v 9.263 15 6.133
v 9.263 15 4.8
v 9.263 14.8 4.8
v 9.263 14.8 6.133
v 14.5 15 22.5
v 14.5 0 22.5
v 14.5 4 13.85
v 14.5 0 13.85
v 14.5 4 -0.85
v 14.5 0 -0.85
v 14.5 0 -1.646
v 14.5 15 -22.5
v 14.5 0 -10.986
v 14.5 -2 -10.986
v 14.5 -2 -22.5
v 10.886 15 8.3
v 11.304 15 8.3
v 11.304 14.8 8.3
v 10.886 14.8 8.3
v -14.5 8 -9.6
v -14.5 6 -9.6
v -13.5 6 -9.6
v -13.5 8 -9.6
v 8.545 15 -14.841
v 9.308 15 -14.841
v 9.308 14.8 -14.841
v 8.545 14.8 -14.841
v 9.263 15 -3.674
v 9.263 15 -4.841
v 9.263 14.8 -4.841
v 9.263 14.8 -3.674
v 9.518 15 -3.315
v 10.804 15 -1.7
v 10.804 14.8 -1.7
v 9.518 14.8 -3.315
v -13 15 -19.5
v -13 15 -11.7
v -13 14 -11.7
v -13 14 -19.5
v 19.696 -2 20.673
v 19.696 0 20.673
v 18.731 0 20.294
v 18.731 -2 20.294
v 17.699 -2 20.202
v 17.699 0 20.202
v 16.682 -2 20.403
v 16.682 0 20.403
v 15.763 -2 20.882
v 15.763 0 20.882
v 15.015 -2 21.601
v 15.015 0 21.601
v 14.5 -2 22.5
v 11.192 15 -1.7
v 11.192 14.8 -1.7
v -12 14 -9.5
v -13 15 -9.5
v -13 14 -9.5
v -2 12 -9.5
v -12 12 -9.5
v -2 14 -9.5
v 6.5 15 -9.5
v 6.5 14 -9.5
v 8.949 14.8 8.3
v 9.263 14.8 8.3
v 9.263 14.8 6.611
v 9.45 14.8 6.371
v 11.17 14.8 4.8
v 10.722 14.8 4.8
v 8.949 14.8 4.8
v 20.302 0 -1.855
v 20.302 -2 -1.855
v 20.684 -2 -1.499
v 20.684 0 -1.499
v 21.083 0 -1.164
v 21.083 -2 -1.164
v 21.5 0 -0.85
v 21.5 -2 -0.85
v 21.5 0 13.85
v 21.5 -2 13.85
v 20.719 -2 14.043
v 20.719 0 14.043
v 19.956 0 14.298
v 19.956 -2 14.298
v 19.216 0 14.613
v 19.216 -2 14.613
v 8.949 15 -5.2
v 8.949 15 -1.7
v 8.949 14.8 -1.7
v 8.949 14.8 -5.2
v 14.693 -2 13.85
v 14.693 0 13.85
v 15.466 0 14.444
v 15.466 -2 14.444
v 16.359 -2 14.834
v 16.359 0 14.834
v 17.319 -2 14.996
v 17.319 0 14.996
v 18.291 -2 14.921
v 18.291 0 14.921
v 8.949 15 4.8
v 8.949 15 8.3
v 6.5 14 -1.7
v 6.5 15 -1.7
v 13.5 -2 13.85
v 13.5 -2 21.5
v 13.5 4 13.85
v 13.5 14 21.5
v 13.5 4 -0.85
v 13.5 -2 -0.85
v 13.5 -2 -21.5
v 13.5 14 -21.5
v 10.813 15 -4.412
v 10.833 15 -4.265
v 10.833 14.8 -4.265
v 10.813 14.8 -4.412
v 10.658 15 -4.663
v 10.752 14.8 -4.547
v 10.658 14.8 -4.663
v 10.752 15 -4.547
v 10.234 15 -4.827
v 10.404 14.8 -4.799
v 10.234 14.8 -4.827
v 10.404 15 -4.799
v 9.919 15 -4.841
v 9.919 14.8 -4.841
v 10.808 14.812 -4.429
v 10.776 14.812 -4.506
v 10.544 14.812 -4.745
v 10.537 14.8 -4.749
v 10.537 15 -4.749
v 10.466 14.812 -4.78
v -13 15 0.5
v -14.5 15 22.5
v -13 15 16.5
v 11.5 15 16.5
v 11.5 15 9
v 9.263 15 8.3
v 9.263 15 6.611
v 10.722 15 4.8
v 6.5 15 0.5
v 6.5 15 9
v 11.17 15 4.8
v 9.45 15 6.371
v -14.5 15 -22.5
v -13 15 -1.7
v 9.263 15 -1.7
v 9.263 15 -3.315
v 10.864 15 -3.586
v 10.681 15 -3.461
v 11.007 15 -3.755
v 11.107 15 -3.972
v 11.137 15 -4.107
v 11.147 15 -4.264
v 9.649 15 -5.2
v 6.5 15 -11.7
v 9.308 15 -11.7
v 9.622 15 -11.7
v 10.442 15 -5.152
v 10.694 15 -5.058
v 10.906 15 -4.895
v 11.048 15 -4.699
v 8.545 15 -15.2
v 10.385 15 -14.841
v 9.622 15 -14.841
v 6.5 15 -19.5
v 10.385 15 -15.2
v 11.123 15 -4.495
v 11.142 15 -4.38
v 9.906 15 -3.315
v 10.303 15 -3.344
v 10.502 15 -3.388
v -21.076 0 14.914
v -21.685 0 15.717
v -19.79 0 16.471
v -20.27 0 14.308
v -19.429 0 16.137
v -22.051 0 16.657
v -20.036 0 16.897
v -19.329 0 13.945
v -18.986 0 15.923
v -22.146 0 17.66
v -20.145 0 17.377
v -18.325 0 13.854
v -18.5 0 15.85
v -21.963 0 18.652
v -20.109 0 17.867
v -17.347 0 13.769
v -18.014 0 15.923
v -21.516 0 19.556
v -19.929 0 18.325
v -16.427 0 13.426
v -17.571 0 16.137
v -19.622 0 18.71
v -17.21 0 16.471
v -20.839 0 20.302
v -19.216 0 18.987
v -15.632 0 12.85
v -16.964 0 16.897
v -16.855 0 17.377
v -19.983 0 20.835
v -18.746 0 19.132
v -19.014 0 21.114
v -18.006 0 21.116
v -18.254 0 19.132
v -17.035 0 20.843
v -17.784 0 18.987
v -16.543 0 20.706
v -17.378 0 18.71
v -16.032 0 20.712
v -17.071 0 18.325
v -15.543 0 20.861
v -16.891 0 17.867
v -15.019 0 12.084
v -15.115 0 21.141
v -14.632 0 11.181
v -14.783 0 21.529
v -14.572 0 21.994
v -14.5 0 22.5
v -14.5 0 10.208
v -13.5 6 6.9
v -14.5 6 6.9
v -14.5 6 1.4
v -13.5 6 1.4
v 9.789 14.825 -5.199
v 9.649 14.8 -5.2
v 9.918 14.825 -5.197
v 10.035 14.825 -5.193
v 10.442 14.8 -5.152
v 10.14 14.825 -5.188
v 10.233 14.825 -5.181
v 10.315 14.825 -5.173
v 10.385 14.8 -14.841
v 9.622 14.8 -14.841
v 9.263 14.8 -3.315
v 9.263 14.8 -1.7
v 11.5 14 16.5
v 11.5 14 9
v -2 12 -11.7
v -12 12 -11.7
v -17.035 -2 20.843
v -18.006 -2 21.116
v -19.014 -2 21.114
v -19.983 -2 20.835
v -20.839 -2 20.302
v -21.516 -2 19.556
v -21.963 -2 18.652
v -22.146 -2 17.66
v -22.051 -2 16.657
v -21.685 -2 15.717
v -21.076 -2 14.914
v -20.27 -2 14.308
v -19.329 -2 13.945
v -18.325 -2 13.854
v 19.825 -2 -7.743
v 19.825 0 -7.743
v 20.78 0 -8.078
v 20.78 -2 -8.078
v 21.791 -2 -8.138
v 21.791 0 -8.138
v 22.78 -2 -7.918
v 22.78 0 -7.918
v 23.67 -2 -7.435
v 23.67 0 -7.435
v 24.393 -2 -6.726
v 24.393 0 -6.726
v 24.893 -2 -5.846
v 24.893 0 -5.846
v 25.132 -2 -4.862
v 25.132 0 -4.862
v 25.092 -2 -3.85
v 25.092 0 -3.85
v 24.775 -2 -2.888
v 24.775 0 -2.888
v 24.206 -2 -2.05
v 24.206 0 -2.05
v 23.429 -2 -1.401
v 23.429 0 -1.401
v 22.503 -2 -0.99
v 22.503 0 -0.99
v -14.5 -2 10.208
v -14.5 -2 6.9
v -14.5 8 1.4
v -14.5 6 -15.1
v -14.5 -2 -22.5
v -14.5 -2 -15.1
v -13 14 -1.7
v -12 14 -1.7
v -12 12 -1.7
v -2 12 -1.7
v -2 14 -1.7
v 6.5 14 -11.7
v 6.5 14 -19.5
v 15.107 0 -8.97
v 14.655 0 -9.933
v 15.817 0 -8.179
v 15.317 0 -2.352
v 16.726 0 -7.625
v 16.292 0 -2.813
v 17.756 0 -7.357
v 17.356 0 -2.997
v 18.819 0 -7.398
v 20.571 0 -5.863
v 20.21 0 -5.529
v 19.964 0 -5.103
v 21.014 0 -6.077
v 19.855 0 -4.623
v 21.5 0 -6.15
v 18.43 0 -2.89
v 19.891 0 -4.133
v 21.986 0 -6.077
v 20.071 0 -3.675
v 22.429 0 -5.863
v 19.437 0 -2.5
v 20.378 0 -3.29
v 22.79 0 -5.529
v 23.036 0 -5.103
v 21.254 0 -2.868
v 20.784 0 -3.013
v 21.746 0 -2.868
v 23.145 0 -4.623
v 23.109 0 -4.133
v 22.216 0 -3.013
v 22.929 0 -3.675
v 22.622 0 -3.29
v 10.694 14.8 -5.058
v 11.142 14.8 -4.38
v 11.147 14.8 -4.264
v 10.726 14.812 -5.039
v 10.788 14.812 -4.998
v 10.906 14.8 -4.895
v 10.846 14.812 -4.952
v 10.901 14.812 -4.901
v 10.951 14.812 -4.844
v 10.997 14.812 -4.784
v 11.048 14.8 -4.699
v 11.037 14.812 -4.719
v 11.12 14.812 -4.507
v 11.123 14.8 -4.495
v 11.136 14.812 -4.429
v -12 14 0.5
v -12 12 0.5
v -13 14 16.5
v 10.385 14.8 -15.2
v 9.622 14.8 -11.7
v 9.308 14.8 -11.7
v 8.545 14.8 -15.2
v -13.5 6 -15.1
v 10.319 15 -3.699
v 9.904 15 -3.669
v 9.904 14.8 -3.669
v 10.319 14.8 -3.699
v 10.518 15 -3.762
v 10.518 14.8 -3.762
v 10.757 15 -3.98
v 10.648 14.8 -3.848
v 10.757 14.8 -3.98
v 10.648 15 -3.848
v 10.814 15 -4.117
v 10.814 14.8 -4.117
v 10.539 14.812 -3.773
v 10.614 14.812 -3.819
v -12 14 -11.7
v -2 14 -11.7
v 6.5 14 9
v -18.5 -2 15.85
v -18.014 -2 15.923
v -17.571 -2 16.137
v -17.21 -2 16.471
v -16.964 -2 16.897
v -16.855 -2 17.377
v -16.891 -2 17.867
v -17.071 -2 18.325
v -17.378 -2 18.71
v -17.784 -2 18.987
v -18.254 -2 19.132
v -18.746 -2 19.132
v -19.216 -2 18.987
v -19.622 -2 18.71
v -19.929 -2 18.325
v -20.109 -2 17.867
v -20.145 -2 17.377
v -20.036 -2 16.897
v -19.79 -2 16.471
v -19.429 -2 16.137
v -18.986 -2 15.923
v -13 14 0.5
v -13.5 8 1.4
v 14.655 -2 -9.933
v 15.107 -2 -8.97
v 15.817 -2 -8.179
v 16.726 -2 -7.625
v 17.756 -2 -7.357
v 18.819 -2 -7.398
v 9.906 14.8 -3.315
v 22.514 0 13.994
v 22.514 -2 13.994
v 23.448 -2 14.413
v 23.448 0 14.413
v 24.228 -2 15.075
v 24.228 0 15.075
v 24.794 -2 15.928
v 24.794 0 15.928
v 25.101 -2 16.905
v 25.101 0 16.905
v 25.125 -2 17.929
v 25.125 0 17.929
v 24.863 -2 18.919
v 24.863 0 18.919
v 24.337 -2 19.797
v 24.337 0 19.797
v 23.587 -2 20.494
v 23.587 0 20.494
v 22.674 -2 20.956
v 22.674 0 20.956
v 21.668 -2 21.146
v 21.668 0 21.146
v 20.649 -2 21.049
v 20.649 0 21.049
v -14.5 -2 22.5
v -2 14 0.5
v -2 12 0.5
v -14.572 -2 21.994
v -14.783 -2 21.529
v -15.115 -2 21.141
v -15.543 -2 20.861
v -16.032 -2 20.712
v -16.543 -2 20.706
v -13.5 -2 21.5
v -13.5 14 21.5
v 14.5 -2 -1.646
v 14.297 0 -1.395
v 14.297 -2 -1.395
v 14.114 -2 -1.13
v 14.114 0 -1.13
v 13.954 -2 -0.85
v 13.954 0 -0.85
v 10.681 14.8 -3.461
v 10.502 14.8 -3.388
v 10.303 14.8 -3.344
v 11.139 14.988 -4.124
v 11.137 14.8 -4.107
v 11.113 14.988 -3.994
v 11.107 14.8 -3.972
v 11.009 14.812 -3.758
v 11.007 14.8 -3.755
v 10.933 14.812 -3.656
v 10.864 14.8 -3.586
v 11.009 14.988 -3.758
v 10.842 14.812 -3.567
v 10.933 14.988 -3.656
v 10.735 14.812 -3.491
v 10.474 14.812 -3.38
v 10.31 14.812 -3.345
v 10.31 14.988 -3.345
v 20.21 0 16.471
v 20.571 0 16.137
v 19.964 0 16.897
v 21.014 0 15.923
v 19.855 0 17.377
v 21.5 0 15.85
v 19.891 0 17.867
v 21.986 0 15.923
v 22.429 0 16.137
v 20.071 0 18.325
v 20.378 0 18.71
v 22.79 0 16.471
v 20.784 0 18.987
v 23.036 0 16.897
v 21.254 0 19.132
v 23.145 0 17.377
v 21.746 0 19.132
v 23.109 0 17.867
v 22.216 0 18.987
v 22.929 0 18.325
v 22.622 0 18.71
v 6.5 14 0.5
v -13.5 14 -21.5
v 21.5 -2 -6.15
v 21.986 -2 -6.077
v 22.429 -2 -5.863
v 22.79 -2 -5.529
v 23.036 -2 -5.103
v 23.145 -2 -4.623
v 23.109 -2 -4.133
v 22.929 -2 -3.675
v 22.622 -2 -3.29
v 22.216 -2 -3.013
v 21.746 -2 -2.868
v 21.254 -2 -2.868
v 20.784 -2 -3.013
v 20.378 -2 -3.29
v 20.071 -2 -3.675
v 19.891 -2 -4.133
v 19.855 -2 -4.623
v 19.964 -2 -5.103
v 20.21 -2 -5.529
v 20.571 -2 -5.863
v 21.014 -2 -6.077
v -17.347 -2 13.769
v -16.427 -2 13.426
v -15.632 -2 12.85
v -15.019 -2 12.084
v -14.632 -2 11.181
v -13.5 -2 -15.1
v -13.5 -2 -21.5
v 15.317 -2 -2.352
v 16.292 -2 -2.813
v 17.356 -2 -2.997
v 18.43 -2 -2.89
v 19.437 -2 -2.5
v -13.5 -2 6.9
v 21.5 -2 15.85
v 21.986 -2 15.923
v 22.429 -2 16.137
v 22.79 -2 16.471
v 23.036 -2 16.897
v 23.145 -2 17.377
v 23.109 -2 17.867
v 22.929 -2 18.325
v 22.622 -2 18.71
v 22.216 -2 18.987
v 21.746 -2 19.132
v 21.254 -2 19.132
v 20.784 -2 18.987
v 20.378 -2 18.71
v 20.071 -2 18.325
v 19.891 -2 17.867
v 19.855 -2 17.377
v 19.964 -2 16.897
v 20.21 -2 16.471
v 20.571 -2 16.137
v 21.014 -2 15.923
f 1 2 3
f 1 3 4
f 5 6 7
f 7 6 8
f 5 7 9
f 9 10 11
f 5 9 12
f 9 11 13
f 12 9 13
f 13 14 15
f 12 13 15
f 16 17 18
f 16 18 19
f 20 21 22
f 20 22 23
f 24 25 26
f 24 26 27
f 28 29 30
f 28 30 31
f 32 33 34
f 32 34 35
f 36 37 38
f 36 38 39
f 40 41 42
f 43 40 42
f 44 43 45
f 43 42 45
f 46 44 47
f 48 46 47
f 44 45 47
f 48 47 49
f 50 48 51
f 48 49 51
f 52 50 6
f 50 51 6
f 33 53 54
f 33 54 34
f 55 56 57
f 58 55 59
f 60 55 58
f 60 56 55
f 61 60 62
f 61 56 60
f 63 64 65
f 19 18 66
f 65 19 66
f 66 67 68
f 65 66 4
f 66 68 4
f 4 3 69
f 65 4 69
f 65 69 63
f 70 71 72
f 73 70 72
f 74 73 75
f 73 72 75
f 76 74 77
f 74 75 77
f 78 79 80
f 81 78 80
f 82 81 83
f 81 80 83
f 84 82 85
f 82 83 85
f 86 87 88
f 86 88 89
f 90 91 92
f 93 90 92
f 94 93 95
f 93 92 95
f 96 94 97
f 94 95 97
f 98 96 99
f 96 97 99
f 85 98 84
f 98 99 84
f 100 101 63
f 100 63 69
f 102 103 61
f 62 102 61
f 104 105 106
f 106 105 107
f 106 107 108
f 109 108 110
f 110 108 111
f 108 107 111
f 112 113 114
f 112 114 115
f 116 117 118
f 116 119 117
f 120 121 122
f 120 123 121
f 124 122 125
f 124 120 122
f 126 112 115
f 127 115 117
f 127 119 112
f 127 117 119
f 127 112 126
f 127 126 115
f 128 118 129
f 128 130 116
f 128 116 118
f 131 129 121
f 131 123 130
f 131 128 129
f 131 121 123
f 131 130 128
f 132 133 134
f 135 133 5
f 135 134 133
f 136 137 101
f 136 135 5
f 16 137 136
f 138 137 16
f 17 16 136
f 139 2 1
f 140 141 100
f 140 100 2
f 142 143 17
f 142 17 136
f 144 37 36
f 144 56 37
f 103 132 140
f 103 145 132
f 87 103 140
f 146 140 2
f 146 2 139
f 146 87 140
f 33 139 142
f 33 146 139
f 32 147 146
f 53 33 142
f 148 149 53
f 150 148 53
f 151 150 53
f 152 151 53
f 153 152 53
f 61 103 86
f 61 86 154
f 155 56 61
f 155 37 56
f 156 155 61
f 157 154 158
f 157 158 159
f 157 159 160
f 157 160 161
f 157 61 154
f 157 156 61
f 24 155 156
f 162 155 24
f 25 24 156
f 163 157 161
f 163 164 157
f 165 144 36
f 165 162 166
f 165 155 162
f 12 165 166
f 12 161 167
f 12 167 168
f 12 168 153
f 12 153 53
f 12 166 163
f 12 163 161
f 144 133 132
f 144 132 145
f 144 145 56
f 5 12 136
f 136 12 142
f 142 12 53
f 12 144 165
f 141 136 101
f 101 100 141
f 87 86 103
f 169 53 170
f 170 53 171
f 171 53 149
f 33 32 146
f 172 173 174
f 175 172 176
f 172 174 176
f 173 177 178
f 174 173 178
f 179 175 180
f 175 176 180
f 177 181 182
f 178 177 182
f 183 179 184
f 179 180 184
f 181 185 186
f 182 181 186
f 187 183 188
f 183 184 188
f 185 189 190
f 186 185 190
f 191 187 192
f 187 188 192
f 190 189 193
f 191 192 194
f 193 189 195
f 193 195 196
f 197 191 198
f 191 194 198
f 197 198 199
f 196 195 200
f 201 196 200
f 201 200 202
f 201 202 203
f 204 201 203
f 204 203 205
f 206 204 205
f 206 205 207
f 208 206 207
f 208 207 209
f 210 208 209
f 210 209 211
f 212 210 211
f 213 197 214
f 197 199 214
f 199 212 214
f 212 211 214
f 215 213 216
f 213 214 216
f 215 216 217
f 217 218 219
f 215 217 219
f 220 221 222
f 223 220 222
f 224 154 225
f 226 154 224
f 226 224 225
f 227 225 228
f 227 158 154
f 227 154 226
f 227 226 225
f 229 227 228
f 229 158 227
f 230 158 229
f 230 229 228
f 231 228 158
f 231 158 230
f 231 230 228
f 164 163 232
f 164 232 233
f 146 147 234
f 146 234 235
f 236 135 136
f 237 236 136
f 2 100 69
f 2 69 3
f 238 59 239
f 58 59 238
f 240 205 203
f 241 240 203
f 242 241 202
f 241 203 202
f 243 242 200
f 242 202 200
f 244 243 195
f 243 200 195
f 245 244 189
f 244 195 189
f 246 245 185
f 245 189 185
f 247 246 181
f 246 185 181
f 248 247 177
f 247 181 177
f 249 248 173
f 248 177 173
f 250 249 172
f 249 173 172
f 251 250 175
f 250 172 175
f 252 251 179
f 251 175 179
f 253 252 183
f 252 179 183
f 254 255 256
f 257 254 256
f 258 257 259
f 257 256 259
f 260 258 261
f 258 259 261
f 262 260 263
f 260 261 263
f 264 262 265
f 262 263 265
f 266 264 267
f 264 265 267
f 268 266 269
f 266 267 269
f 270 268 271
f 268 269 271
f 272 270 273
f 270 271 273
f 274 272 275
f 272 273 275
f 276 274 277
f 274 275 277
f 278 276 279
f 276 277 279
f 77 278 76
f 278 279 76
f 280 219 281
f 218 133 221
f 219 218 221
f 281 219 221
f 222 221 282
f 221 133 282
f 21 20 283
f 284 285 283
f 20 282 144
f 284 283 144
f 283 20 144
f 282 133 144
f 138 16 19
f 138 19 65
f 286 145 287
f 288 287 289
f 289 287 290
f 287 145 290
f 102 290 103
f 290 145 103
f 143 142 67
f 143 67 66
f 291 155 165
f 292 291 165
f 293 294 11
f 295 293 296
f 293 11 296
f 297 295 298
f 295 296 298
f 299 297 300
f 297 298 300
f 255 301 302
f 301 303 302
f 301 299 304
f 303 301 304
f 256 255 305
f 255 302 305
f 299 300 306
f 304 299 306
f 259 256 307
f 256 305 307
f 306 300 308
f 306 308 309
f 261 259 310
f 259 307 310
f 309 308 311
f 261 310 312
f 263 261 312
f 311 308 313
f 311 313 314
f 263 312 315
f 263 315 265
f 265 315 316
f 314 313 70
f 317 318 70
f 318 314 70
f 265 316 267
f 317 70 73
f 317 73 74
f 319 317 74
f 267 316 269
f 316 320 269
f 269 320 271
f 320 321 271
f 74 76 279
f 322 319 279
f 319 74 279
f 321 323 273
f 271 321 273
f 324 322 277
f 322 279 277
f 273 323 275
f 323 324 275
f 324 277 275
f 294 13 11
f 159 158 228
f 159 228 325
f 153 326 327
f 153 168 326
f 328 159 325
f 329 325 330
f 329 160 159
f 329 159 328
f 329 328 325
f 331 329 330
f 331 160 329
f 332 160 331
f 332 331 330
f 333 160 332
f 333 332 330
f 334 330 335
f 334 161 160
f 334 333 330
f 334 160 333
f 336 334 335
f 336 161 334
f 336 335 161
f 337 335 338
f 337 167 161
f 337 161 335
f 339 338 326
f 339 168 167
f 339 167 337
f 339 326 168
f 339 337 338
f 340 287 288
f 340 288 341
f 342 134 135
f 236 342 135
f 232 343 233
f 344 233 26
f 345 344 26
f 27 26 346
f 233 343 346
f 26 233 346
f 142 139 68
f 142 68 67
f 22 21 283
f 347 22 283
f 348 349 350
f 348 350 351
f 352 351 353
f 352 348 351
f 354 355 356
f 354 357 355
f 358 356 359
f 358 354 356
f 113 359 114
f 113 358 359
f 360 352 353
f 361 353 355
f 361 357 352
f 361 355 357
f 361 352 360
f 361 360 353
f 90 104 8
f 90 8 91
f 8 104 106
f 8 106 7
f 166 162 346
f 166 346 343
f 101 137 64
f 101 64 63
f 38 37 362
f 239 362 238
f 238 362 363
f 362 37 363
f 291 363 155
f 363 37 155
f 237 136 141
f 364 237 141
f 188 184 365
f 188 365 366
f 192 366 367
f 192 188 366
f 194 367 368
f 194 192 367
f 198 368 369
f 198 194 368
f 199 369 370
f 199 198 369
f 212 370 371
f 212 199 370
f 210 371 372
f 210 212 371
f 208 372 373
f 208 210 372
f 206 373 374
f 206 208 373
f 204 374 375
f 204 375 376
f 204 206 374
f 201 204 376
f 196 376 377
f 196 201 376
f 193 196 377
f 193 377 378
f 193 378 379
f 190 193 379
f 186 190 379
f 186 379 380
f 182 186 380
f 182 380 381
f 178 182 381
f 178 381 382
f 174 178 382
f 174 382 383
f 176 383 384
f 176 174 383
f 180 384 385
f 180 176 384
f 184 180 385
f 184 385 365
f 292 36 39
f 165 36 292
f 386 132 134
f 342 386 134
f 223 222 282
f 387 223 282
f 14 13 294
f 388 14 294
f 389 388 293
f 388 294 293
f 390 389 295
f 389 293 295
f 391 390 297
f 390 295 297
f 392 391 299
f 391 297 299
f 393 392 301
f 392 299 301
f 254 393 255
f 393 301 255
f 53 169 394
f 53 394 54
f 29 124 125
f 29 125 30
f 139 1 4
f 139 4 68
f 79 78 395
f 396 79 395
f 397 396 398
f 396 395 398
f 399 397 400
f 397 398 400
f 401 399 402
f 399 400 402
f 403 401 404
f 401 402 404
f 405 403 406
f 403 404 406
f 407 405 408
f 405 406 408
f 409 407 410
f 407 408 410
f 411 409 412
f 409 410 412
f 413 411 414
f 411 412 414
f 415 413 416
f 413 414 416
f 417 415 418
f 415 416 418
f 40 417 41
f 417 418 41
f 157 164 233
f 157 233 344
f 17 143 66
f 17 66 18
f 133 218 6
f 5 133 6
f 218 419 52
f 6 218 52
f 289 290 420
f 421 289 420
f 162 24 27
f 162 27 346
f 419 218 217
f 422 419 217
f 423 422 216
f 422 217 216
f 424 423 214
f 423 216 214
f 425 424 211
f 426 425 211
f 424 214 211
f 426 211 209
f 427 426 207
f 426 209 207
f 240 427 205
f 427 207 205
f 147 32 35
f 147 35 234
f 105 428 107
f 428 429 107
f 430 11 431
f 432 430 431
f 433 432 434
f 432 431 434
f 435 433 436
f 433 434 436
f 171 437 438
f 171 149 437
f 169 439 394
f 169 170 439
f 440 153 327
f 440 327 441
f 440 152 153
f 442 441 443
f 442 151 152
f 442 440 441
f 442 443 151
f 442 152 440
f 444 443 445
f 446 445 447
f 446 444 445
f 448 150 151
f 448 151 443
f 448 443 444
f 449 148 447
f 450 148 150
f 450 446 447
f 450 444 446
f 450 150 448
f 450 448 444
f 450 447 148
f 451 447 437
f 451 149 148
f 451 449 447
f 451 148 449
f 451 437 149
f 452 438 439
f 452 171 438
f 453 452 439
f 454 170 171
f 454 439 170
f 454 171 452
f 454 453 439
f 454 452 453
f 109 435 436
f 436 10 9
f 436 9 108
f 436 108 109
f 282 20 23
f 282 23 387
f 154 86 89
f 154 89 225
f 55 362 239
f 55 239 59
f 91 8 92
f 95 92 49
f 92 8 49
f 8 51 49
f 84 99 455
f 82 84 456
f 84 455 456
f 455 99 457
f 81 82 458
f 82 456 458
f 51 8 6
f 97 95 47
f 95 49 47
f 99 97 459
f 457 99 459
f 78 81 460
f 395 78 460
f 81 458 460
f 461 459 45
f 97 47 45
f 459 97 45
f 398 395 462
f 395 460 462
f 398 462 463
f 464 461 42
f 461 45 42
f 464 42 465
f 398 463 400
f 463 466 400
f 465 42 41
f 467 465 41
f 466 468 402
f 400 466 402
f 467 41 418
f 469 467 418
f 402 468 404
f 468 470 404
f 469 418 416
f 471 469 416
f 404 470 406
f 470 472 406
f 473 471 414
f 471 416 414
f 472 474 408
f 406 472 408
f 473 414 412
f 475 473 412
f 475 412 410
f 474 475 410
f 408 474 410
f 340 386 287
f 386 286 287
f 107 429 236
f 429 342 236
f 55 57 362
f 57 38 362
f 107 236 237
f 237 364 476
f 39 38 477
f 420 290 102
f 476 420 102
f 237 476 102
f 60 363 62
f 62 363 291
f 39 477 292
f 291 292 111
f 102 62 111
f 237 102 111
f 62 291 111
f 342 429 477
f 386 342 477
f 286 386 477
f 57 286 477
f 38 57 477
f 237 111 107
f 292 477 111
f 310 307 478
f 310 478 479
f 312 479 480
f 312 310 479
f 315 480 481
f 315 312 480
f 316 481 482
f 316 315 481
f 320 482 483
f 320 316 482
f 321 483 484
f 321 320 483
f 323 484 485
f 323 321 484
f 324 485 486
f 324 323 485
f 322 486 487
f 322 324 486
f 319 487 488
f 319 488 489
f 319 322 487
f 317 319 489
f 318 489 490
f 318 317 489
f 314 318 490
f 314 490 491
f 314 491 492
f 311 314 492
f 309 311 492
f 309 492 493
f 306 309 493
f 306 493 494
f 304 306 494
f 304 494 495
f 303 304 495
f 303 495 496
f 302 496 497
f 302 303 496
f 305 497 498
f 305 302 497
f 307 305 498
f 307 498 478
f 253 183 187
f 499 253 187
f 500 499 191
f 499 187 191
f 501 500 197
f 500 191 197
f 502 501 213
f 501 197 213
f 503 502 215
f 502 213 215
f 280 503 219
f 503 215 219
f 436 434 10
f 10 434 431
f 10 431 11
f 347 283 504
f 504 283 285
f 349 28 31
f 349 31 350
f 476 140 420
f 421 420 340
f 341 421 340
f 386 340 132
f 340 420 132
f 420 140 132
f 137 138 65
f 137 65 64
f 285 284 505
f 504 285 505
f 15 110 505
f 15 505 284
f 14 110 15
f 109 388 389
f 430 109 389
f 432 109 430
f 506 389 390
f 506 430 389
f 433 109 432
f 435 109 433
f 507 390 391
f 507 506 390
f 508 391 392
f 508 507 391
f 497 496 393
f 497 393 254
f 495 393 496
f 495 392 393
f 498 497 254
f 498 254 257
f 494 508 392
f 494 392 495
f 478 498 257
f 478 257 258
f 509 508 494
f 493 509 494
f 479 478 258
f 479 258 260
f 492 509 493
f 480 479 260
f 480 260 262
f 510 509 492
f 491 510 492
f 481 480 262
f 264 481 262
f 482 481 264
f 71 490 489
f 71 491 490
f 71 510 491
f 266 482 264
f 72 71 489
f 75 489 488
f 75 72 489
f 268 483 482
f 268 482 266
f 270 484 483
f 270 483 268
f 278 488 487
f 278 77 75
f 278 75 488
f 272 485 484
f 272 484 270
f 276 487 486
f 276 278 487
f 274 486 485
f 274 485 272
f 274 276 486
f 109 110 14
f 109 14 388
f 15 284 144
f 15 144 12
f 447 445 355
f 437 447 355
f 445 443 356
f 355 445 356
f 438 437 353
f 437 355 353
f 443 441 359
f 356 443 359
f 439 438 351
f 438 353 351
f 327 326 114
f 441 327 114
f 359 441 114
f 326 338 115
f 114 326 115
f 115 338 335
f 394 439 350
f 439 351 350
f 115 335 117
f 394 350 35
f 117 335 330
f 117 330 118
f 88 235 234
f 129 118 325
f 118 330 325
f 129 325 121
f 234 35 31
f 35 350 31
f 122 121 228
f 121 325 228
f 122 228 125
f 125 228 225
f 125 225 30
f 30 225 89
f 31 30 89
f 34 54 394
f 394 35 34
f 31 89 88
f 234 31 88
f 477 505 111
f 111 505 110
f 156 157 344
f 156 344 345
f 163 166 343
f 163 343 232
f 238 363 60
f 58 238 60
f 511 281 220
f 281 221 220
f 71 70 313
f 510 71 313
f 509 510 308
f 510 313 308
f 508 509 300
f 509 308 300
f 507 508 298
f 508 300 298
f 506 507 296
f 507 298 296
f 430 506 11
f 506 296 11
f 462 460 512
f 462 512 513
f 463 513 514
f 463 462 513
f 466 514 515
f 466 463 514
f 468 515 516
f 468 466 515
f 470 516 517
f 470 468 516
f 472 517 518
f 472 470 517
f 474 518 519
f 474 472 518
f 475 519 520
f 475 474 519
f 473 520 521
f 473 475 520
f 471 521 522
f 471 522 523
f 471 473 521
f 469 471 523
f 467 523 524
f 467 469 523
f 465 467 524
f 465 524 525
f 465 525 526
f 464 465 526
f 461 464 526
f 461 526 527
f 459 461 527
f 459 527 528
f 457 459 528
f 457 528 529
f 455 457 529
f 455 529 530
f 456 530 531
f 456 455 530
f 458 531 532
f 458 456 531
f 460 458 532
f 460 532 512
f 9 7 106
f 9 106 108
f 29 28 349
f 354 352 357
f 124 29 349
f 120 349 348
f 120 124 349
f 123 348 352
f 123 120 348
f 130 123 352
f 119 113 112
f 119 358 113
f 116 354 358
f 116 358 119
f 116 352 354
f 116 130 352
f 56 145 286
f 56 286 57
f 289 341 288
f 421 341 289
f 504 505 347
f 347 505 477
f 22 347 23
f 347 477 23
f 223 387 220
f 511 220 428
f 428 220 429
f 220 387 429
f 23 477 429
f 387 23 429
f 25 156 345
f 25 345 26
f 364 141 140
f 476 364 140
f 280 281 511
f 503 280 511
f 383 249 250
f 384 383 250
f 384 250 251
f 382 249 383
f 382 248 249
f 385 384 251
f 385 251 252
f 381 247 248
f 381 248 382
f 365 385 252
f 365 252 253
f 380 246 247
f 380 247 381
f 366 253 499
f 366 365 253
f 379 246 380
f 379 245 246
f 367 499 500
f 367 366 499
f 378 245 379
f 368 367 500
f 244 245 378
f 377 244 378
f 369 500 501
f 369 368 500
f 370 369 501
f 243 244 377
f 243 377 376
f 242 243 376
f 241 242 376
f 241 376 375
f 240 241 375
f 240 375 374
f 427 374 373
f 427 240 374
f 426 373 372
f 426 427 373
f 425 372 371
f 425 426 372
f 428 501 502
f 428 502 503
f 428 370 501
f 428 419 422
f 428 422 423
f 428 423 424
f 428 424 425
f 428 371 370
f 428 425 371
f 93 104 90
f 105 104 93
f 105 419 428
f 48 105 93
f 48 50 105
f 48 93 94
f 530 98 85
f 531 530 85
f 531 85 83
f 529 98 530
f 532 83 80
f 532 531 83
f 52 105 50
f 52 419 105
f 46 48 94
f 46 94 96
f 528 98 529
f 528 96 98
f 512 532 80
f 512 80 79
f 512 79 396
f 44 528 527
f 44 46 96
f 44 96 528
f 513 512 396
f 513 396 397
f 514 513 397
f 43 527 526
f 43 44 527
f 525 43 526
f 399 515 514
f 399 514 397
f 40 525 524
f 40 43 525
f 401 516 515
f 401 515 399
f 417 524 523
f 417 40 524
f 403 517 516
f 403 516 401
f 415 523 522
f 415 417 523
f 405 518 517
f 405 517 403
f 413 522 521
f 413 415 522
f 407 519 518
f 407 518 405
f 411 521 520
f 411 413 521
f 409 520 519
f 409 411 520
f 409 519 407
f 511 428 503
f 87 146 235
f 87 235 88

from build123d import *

# Parameters (mm, degrees)
SKETCH1_W           = 29
SKETCH1_H           = 45
BOSS_EXTRUDE1_DEPTH = 15
SHELL2_T            = -1
SKETCH2_W           = 19.5
SKETCH2_H           = 7.8
CUT_EXTRUDE2_DEPTH  = 31.683871985
SKETCH3_W           = 10
SKETCH3_H           = 2.2
BOSS_EXTRUDE2_DEPTH = 2
CUTOUT_W            = 11
CUTOUT_H            = 2
CUT_EXTRUDE3_DEPTH  = 1
SKETCH5_R           = 1.65
BOSS_EXTRUDE3_DEPTH = 2
CUT_EXTRUDE4_DEPTH  = 0.2
CUT_EXTRUDE5_REACH  = 47.546
SKETCH7_W           = 14.7
SKETCH7_H           = 4
CUT_EXTRUDE6_DEPTH  = 10
FILLET1_R           = 10


with BuildPart() as part:
    # Sketch1 → Boss-Extrude1 (new body)
    with BuildSketch(Plane(origin=(0, 0, 0), x_dir=(1, 0, 0), z_dir=(0, 1, 0))):
        Rectangle(SKETCH1_W, SKETCH1_H)
    extrude(amount=BOSS_EXTRUDE1_DEPTH)

    # Shell2
    shell2_openings = [part.faces().sort_by_distance(p)[0] for p in [
        (0, 0, 0),
    ]]
    offset(amount=SHELL2_T, openings=shell2_openings, kind=Kind.INTERSECTION)

    # Sketch2 → Cut-Extrude2 (cut, through all)
    with BuildSketch(Plane(origin=(0, 15, 0), x_dir=(1, 0, 0), z_dir=(0, 1, 0))):
        with Locations((-3.25, 5.6)):
            Rectangle(SKETCH2_W, SKETCH2_H)
        with Locations((-3.25, 15.6)):
            Rectangle(SKETCH2_W, SKETCH2_H)
        Polygon((-13, -0.5), (-13, -8.3), (-13, -9.7), (-13, -16.5), (11.5, -16.5), (11.5, -9), (6.5, -9), (6.5, -8.3), (6.5, -0.5), align=None)
    extrude(amount=-CUT_EXTRUDE2_DEPTH, mode=Mode.SUBTRACT)

    # Sketch3 → Boss-Extrude2 (add)
    with BuildSketch(Plane.XZ.offset(-14)):
        with Locations((-7, -0.6)):
            Rectangle(SKETCH3_W, SKETCH3_H)
        with Locations((-7, -10.6)):
            Rectangle(SKETCH3_W, SKETCH3_H)
    extrude(amount=BOSS_EXTRUDE2_DEPTH)

    # cutout → Cut-Extrude3 (cut)
    with BuildSketch(Plane.ZY.offset(14.5)):
        with Locations((-4.1, 7)):
            Rectangle(CUTOUT_W, CUTOUT_H)
        Polygon((-9.6, 6), (-15.1, 6), (-15.1, 0), (6.9, 0), (6.9, 6), (1.4, 6), align=None)
    extrude(amount=-CUT_EXTRUDE3_DEPTH, mode=Mode.SUBTRACT)

    # Sketch5 → Boss-Extrude3 (add)
    # profile 1 of 2: a face of its own
    with BuildSketch(Plane.XZ):
        with BuildLine():
            Line((-14.5, 10.208395238), (-14.5, 6.9))
            Line((-14.5, 6.9), (-13.5, 6.9))
            Line((-13.5, 6.9), (-13.5, 21.5))
            Line((-13.5, 21.5), (13.5, 21.5))
            Line((13.5, 21.5), (13.5, 13.85))
            Line((13.5, 13.85), (21.5, 13.85))
            ThreePointArc((21.5, 13.85), (25.028786021, 18.432828613), (19.696299962, 20.673194947))
            ThreePointArc((19.696299962, 20.673194947), (16.682040183, 20.402983861), (14.5, 22.5))
            Line((14.5, 22.5), (-14.5, 22.5))
            ThreePointArc((-14.5, 22.5), (-15.319286654, 20.985758581), (-17.035039959, 20.843111138))
            ThreePointArc((-17.035039959, 20.843111138), (-22.089372546, 18.162498848), (-18.325, 13.854197619))
            ThreePointArc((-18.325, 13.854197619), (-15.631692036, 12.850482481), (-14.5, 10.208395238))
        make_face()
        with Locations(Location((-18.5, 17.5, 0), (0, 0, 270))):
            Circle(SKETCH5_R, mode=Mode.SUBTRACT)
        with Locations(Location((21.5, 17.5, 0), (0, 0, 270))):
            Circle(SKETCH5_R, mode=Mode.SUBTRACT)
    # profile 2 of 2: a face of its own
    with BuildSketch(Plane.XZ):
        with BuildLine():
            Line((14.5, -22.5), (14.5, -10.985946346))
            ThreePointArc((14.5, -10.985946346), (16.25148084, -7.86855561), (19.825, -7.742973173))
            ThreePointArc((19.825, -7.742973173), (25.046783901, -5.361872357), (21.5, -0.85))
            Line((21.5, -0.85), (13.5, -0.85))
            Line((13.5, -0.85), (13.5, -21.5))
            Line((13.5, -21.5), (-13.5, -21.5))
            Line((-13.5, -21.5), (-13.5, -15.1))
            Line((-13.5, -15.1), (-14.5, -15.1))
            Line((-14.5, -15.1), (-14.5, -22.5))
            Line((-14.5, -22.5), (14.5, -22.5))
        make_face()
        with Locations(Location((21.5, -4.5, 0), (0, 0, 270))):
            Circle(SKETCH5_R, mode=Mode.SUBTRACT)
    extrude(amount=BOSS_EXTRUDE3_DEPTH)

    # Sketch6 → Cut-Extrude4 (cut)
    # profile 1 of 3: a face of its own
    with BuildSketch(Plane(origin=(0, 15, 0), x_dir=(1, 0, 0), z_dir=(0, 1, 0))):
        Polygon((8.544871795, 14.841025641), (8.544871795, 15.2), (10.384615385, 15.2), (10.384615385, 14.841025641), (9.621794872, 14.841025641), (9.621794872, 11.7), (9.307692308, 11.7), (9.307692308, 14.841025641), align=None)
    # profile 2 of 3: a face of its own
    with BuildSketch(Plane(origin=(0, 15, 0), x_dir=(1, 0, 0), z_dir=(0, 1, 0))):
        with BuildLine():
            Line((8.948717949, 5.2), (9.649138622, 5.2))
            add(Edge.make_bspline(
                [(9.649138622, 5.2), (9.69587975, 5.199844414), (9.785627895, 5.199545672), (9.914201165, 5.197879909), (10.031028262, 5.193105553), (10.136048101, 5.18899697), (10.229258756, 5.181505028), (10.310946047, 5.174344381), (10.380733745, 5.16497072), (10.422979596, 5.156265297), (10.442107372, 5.152323718)],
                knots=[0, 0, 0, 0, 1.410062039, 2.707475311, 3.878576406, 4.937260626, 5.877586885, 6.699081471, 7.410979367, 8, 8, 8, 8], degree=3))
            add(Edge.make_bspline(
                [(10.442107372, 5.152323718), (10.467713996, 5.145996953), (10.518380985, 5.133478389), (10.591331051, 5.107018788), (10.660845375, 5.076399163), (10.7266352, 5.040435443), (10.788370991, 4.998860663), (10.846689302, 4.952392541), (10.901854765, 4.901285335), (10.951636395, 4.844250494), (10.998575447, 4.784413984), (11.038164073, 4.719710227), (11.072290553, 4.6520487), (11.09946107, 4.580741282), (11.121339044, 4.50647951), (11.136765283, 4.428590713), (11.146016471, 4.347429738), (11.146958326, 4.29207183), (11.147435897, 4.264002404)],
                knots=[0, 0, 0, 0, 1.027469482, 2.033020251, 3.019912614, 3.986113645, 4.951240523, 5.91722682, 6.890402269, 7.87763091, 8.8651537, 9.85103654, 10.82876324, 11.815024772, 12.821070561, 13.842952187, 14.906261191, 16, 16, 16, 16], degree=3))
            add(Edge.make_bspline(
                [(11.147435897, 4.264002404), (11.145966899, 4.217367299), (11.143100504, 4.126370131), (11.1163754, 3.99430925), (11.07259888, 3.871119935), (11.012275591, 3.756957297), (10.935456115, 3.654046652), (10.843131324, 3.563656197), (10.735249713, 3.488016284), (10.634820397, 3.435563479), (10.546106197, 3.401970571), (10.473072884, 3.378334212), (10.393405907, 3.360072247), (10.307868572, 3.343712115), (10.216104917, 3.33136042), (10.118334877, 3.322313826), (10.014488726, 3.316659777), (9.943149656, 3.315817772), (9.906450321, 3.315384615)],
                knots=[0, 0, 0, 0, 1.260483769, 2.459530307, 3.627416485, 4.787058657, 5.939039949, 7.08810263, 8.267026773, 9.491475466, 10.141966685, 10.831826277, 11.566392101, 12.351337768, 13.187381173, 14.07005841, 15.007169909, 16, 16, 16, 16], degree=3))
            Line((9.906450321, 3.315384615), (11.192307692, 1.7))
            Line((11.192307692, 1.7), (10.803886218, 1.7))
            Line((10.803886218, 1.7), (9.518028846, 3.315384615))
            Line((9.518028846, 3.315384615), (9.262820513, 3.315384615))
            Line((9.262820513, 3.315384615), (9.262820513, 1.7))
            Line((9.262820513, 1.7), (8.948717949, 1.7))
            Line((8.948717949, 1.7), (8.948717949, 5.2))
        make_face()
        with BuildLine():
            Line((9.262820513, 4.841025641), (9.262820513, 3.674358974))
            Line((9.262820513, 3.674358974), (9.903645833, 3.669451122))
            add(Edge.make_bspline(
                [(9.903645833, 3.669451122), (9.933565872, 3.669437885), (9.991559429, 3.669412229), (10.075460094, 3.673406005), (10.153580206, 3.677949323), (10.225620958, 3.684898669), (10.291614533, 3.69385474), (10.351527947, 3.705057725), (10.405458998, 3.718109787), (10.468357537, 3.738311413), (10.538594068, 3.770317431), (10.614925528, 3.81688293), (10.679927866, 3.875452049), (10.734845728, 3.942425505), (10.77897516, 4.016061754), (10.810087214, 4.095478123), (10.829829656, 4.178669721), (10.832158202, 4.235847829), (10.833333333, 4.264703526)],
                knots=[0, 0, 0, 0, 1.146690395, 2.22261258, 3.21895312, 4.145990853, 4.996080663, 5.770904154, 6.481378293, 7.121626537, 8.300444488, 9.431385265, 10.535395872, 11.636531494, 12.74115979, 13.810798291, 14.895190096, 16, 16, 16, 16], degree=3))
            add(Edge.make_bspline(
                [(10.833333333, 4.264703526), (10.832131212, 4.292850099), (10.829749047, 4.348626338), (10.810300278, 4.430282248), (10.777410897, 4.507349198), (10.733088659, 4.579513683), (10.679089504, 4.645019419), (10.615771691, 4.701066572), (10.544866496, 4.747316037), (10.478595298, 4.776870418), (10.419361085, 4.794990271), (10.367931425, 4.807741435), (10.309819948, 4.817985904), (10.244744489, 4.826193964), (10.172982858, 4.833248909), (10.094172207, 4.838000687), (10.008835427, 4.840814551), (9.949688496, 4.84095364), (9.919070513, 4.841025641)],
                knots=[0, 0, 0, 0, 1.101028733, 2.181837193, 3.264309656, 4.369019818, 5.486613113, 6.575447106, 7.666700264, 8.788928104, 9.402425223, 10.0903467, 10.862060571, 11.710948788, 12.657782767, 13.684531032, 14.801375019, 16, 16, 16, 16], degree=3))
            Line((9.919070513, 4.841025641), (9.262820513, 4.841025641))
        make_face(mode=Mode.SUBTRACT)
    # profile 3 of 3: a face of its own
    with BuildSketch(Plane(origin=(0, 15, 0), x_dir=(1, 0, 0), z_dir=(0, 1, 0))):
        Polygon((8.948717949, -4.8), (9.262820513, -4.8), (9.262820513, -6.132832532), (10.721854968, -4.8), (11.169871795, -4.8), (9.450020032, -6.370512821), (11.304487179, -8.3), (10.885917468, -8.3), (9.262820513, -6.610997596), (9.262820513, -8.3), (8.948717949, -8.3), align=None)
    extrude(amount=-CUT_EXTRUDE4_DEPTH, mode=Mode.SUBTRACT)

    # Sketch7 → Cut-Extrude5 (cut, up to next)
    with BuildSketch(Plane(origin=(14.5, 0, 0), x_dir=(0, 0, -1), z_dir=(1, 0, 0)), mode=Mode.PRIVATE) as cut_extrude5_sk1:
        with Locations((-6.5, 2)):
            Rectangle(SKETCH7_W, SKETCH7_H)
    cut_extrude5_tool1 = extrude(cut_extrude5_sk1.sketch, amount=-CUT_EXTRUDE5_REACH, mode=Mode.PRIVATE) & part.part
    add(cut_extrude5_tool1.solids().sort_by_distance((14.5, 2, 6.5))[0], mode=Mode.SUBTRACT)

    # Sketch8 → Cut-Extrude6 (cut)
    with BuildSketch(Plane(origin=(0, 0, 0), x_dir=(1, 0, 0), z_dir=(0, 1, 0))):
        with BuildLine():
            ThreePointArc((14.69331156, -13.85), (17.5, -15), (20.30668844, -13.85))
            Line((20.30668844, -13.85), (14.69331156, -13.85))
        make_face()
        with BuildLine():
            Line((14.69331156, -13.85), (20.30668844, -13.85))
            ThreePointArc((20.30668844, -13.85), (21.189630995, -12.544869936), (21.5, -11))
            ThreePointArc((21.5, -11), (15.955130064, -7.310369005), (14.69331156, -13.85))
        make_face()
        with BuildLine():
            ThreePointArc((21.046477125, 0.85), (17.982663806, 2.970772677), (14.5, 1.645751311))
            Line((14.5, 1.645751311), (14.5, 0.85))
            Line((14.5, 0.85), (21.046477125, 0.85))
        make_face()
        with BuildLine():
            Line((14.5, 0.85), (14.5, 1.645751311))
            ThreePointArc((14.5, 1.645751311), (16.085786438, -4.741657387), (21.5, -1))
            ThreePointArc((21.5, -1), (21.384965154, -0.047610505), (21.046477125, 0.85))
            Line((21.046477125, 0.85), (14.5, 0.85))
        make_face()
    extrude(amount=-CUT_EXTRUDE6_DEPTH, mode=Mode.SUBTRACT)

    # Fillet1
    # the kernel refuses this fillet: 10 mm, written as the material it takes off along each edge
    with BuildSketch(Plane(origin=(21.046477125, -5.126143642, -0.85), x_dir=(-0.5954001389119016, 0, -0.8034293214612523), z_dir=(0, 1, 0))) as fillet1_piece_1:
        with BuildLine():
            CenterArc((2.813529277, -9.877084918), FILLET1_R, 98.992616394, 8.967548011)
            Line((-0.270027583, -0.364373576), (-0.33169872, -0.174119349))
            ThreePointArc((-0.33169872, -0.174119349), (-0.295699656, -0.06310676), (-0.160685864, 0.119080028))
            Line((-0.160685864, 0.119080028), (0.031261436, 0.197541698))
            ThreePointArc((0.031261436, 0.197541698), (0.625228728, 0.150833967), (1.21919602, 0.197541698))
            Line((1.21919602, 0.197541698), (1.250457457, 0))
        make_face()
    extrude(amount=8.252287283, mode=Mode.SUBTRACT)
    with BuildSketch(Plane(origin=(20.30668844, -5.329363755, 13.85), x_dir=(-0.8193644478649244, 0, 0.5732729730023975), z_dir=(0, 1, 0))) as fillet1_piece_2:
        with BuildLine():
            CenterArc((2.99642738, 9.860468257), FILLET1_R, 246.583108126, 13.834356768)
            Line((-0.977757067, 0.684093266), (-1.057240756, 0.500565766))
            ThreePointArc((-1.057240756, 0.500565766), (-0.603533128, 0.178173743), (-0.114654595, -0.16387289))
            Line((-0.114654595, -0.16387289), (0.033293638, -0.197209365))
            ThreePointArc((0.033293638, -0.197209365), (0.665872751, -0.144187303), (1.298451864, -0.197209365))
            Line((1.298451864, -0.197209365), (1.331745502, 0))
        make_face()
    extrude(amount=8.65872751, mode=Mode.SUBTRACT)


solid = part.part
